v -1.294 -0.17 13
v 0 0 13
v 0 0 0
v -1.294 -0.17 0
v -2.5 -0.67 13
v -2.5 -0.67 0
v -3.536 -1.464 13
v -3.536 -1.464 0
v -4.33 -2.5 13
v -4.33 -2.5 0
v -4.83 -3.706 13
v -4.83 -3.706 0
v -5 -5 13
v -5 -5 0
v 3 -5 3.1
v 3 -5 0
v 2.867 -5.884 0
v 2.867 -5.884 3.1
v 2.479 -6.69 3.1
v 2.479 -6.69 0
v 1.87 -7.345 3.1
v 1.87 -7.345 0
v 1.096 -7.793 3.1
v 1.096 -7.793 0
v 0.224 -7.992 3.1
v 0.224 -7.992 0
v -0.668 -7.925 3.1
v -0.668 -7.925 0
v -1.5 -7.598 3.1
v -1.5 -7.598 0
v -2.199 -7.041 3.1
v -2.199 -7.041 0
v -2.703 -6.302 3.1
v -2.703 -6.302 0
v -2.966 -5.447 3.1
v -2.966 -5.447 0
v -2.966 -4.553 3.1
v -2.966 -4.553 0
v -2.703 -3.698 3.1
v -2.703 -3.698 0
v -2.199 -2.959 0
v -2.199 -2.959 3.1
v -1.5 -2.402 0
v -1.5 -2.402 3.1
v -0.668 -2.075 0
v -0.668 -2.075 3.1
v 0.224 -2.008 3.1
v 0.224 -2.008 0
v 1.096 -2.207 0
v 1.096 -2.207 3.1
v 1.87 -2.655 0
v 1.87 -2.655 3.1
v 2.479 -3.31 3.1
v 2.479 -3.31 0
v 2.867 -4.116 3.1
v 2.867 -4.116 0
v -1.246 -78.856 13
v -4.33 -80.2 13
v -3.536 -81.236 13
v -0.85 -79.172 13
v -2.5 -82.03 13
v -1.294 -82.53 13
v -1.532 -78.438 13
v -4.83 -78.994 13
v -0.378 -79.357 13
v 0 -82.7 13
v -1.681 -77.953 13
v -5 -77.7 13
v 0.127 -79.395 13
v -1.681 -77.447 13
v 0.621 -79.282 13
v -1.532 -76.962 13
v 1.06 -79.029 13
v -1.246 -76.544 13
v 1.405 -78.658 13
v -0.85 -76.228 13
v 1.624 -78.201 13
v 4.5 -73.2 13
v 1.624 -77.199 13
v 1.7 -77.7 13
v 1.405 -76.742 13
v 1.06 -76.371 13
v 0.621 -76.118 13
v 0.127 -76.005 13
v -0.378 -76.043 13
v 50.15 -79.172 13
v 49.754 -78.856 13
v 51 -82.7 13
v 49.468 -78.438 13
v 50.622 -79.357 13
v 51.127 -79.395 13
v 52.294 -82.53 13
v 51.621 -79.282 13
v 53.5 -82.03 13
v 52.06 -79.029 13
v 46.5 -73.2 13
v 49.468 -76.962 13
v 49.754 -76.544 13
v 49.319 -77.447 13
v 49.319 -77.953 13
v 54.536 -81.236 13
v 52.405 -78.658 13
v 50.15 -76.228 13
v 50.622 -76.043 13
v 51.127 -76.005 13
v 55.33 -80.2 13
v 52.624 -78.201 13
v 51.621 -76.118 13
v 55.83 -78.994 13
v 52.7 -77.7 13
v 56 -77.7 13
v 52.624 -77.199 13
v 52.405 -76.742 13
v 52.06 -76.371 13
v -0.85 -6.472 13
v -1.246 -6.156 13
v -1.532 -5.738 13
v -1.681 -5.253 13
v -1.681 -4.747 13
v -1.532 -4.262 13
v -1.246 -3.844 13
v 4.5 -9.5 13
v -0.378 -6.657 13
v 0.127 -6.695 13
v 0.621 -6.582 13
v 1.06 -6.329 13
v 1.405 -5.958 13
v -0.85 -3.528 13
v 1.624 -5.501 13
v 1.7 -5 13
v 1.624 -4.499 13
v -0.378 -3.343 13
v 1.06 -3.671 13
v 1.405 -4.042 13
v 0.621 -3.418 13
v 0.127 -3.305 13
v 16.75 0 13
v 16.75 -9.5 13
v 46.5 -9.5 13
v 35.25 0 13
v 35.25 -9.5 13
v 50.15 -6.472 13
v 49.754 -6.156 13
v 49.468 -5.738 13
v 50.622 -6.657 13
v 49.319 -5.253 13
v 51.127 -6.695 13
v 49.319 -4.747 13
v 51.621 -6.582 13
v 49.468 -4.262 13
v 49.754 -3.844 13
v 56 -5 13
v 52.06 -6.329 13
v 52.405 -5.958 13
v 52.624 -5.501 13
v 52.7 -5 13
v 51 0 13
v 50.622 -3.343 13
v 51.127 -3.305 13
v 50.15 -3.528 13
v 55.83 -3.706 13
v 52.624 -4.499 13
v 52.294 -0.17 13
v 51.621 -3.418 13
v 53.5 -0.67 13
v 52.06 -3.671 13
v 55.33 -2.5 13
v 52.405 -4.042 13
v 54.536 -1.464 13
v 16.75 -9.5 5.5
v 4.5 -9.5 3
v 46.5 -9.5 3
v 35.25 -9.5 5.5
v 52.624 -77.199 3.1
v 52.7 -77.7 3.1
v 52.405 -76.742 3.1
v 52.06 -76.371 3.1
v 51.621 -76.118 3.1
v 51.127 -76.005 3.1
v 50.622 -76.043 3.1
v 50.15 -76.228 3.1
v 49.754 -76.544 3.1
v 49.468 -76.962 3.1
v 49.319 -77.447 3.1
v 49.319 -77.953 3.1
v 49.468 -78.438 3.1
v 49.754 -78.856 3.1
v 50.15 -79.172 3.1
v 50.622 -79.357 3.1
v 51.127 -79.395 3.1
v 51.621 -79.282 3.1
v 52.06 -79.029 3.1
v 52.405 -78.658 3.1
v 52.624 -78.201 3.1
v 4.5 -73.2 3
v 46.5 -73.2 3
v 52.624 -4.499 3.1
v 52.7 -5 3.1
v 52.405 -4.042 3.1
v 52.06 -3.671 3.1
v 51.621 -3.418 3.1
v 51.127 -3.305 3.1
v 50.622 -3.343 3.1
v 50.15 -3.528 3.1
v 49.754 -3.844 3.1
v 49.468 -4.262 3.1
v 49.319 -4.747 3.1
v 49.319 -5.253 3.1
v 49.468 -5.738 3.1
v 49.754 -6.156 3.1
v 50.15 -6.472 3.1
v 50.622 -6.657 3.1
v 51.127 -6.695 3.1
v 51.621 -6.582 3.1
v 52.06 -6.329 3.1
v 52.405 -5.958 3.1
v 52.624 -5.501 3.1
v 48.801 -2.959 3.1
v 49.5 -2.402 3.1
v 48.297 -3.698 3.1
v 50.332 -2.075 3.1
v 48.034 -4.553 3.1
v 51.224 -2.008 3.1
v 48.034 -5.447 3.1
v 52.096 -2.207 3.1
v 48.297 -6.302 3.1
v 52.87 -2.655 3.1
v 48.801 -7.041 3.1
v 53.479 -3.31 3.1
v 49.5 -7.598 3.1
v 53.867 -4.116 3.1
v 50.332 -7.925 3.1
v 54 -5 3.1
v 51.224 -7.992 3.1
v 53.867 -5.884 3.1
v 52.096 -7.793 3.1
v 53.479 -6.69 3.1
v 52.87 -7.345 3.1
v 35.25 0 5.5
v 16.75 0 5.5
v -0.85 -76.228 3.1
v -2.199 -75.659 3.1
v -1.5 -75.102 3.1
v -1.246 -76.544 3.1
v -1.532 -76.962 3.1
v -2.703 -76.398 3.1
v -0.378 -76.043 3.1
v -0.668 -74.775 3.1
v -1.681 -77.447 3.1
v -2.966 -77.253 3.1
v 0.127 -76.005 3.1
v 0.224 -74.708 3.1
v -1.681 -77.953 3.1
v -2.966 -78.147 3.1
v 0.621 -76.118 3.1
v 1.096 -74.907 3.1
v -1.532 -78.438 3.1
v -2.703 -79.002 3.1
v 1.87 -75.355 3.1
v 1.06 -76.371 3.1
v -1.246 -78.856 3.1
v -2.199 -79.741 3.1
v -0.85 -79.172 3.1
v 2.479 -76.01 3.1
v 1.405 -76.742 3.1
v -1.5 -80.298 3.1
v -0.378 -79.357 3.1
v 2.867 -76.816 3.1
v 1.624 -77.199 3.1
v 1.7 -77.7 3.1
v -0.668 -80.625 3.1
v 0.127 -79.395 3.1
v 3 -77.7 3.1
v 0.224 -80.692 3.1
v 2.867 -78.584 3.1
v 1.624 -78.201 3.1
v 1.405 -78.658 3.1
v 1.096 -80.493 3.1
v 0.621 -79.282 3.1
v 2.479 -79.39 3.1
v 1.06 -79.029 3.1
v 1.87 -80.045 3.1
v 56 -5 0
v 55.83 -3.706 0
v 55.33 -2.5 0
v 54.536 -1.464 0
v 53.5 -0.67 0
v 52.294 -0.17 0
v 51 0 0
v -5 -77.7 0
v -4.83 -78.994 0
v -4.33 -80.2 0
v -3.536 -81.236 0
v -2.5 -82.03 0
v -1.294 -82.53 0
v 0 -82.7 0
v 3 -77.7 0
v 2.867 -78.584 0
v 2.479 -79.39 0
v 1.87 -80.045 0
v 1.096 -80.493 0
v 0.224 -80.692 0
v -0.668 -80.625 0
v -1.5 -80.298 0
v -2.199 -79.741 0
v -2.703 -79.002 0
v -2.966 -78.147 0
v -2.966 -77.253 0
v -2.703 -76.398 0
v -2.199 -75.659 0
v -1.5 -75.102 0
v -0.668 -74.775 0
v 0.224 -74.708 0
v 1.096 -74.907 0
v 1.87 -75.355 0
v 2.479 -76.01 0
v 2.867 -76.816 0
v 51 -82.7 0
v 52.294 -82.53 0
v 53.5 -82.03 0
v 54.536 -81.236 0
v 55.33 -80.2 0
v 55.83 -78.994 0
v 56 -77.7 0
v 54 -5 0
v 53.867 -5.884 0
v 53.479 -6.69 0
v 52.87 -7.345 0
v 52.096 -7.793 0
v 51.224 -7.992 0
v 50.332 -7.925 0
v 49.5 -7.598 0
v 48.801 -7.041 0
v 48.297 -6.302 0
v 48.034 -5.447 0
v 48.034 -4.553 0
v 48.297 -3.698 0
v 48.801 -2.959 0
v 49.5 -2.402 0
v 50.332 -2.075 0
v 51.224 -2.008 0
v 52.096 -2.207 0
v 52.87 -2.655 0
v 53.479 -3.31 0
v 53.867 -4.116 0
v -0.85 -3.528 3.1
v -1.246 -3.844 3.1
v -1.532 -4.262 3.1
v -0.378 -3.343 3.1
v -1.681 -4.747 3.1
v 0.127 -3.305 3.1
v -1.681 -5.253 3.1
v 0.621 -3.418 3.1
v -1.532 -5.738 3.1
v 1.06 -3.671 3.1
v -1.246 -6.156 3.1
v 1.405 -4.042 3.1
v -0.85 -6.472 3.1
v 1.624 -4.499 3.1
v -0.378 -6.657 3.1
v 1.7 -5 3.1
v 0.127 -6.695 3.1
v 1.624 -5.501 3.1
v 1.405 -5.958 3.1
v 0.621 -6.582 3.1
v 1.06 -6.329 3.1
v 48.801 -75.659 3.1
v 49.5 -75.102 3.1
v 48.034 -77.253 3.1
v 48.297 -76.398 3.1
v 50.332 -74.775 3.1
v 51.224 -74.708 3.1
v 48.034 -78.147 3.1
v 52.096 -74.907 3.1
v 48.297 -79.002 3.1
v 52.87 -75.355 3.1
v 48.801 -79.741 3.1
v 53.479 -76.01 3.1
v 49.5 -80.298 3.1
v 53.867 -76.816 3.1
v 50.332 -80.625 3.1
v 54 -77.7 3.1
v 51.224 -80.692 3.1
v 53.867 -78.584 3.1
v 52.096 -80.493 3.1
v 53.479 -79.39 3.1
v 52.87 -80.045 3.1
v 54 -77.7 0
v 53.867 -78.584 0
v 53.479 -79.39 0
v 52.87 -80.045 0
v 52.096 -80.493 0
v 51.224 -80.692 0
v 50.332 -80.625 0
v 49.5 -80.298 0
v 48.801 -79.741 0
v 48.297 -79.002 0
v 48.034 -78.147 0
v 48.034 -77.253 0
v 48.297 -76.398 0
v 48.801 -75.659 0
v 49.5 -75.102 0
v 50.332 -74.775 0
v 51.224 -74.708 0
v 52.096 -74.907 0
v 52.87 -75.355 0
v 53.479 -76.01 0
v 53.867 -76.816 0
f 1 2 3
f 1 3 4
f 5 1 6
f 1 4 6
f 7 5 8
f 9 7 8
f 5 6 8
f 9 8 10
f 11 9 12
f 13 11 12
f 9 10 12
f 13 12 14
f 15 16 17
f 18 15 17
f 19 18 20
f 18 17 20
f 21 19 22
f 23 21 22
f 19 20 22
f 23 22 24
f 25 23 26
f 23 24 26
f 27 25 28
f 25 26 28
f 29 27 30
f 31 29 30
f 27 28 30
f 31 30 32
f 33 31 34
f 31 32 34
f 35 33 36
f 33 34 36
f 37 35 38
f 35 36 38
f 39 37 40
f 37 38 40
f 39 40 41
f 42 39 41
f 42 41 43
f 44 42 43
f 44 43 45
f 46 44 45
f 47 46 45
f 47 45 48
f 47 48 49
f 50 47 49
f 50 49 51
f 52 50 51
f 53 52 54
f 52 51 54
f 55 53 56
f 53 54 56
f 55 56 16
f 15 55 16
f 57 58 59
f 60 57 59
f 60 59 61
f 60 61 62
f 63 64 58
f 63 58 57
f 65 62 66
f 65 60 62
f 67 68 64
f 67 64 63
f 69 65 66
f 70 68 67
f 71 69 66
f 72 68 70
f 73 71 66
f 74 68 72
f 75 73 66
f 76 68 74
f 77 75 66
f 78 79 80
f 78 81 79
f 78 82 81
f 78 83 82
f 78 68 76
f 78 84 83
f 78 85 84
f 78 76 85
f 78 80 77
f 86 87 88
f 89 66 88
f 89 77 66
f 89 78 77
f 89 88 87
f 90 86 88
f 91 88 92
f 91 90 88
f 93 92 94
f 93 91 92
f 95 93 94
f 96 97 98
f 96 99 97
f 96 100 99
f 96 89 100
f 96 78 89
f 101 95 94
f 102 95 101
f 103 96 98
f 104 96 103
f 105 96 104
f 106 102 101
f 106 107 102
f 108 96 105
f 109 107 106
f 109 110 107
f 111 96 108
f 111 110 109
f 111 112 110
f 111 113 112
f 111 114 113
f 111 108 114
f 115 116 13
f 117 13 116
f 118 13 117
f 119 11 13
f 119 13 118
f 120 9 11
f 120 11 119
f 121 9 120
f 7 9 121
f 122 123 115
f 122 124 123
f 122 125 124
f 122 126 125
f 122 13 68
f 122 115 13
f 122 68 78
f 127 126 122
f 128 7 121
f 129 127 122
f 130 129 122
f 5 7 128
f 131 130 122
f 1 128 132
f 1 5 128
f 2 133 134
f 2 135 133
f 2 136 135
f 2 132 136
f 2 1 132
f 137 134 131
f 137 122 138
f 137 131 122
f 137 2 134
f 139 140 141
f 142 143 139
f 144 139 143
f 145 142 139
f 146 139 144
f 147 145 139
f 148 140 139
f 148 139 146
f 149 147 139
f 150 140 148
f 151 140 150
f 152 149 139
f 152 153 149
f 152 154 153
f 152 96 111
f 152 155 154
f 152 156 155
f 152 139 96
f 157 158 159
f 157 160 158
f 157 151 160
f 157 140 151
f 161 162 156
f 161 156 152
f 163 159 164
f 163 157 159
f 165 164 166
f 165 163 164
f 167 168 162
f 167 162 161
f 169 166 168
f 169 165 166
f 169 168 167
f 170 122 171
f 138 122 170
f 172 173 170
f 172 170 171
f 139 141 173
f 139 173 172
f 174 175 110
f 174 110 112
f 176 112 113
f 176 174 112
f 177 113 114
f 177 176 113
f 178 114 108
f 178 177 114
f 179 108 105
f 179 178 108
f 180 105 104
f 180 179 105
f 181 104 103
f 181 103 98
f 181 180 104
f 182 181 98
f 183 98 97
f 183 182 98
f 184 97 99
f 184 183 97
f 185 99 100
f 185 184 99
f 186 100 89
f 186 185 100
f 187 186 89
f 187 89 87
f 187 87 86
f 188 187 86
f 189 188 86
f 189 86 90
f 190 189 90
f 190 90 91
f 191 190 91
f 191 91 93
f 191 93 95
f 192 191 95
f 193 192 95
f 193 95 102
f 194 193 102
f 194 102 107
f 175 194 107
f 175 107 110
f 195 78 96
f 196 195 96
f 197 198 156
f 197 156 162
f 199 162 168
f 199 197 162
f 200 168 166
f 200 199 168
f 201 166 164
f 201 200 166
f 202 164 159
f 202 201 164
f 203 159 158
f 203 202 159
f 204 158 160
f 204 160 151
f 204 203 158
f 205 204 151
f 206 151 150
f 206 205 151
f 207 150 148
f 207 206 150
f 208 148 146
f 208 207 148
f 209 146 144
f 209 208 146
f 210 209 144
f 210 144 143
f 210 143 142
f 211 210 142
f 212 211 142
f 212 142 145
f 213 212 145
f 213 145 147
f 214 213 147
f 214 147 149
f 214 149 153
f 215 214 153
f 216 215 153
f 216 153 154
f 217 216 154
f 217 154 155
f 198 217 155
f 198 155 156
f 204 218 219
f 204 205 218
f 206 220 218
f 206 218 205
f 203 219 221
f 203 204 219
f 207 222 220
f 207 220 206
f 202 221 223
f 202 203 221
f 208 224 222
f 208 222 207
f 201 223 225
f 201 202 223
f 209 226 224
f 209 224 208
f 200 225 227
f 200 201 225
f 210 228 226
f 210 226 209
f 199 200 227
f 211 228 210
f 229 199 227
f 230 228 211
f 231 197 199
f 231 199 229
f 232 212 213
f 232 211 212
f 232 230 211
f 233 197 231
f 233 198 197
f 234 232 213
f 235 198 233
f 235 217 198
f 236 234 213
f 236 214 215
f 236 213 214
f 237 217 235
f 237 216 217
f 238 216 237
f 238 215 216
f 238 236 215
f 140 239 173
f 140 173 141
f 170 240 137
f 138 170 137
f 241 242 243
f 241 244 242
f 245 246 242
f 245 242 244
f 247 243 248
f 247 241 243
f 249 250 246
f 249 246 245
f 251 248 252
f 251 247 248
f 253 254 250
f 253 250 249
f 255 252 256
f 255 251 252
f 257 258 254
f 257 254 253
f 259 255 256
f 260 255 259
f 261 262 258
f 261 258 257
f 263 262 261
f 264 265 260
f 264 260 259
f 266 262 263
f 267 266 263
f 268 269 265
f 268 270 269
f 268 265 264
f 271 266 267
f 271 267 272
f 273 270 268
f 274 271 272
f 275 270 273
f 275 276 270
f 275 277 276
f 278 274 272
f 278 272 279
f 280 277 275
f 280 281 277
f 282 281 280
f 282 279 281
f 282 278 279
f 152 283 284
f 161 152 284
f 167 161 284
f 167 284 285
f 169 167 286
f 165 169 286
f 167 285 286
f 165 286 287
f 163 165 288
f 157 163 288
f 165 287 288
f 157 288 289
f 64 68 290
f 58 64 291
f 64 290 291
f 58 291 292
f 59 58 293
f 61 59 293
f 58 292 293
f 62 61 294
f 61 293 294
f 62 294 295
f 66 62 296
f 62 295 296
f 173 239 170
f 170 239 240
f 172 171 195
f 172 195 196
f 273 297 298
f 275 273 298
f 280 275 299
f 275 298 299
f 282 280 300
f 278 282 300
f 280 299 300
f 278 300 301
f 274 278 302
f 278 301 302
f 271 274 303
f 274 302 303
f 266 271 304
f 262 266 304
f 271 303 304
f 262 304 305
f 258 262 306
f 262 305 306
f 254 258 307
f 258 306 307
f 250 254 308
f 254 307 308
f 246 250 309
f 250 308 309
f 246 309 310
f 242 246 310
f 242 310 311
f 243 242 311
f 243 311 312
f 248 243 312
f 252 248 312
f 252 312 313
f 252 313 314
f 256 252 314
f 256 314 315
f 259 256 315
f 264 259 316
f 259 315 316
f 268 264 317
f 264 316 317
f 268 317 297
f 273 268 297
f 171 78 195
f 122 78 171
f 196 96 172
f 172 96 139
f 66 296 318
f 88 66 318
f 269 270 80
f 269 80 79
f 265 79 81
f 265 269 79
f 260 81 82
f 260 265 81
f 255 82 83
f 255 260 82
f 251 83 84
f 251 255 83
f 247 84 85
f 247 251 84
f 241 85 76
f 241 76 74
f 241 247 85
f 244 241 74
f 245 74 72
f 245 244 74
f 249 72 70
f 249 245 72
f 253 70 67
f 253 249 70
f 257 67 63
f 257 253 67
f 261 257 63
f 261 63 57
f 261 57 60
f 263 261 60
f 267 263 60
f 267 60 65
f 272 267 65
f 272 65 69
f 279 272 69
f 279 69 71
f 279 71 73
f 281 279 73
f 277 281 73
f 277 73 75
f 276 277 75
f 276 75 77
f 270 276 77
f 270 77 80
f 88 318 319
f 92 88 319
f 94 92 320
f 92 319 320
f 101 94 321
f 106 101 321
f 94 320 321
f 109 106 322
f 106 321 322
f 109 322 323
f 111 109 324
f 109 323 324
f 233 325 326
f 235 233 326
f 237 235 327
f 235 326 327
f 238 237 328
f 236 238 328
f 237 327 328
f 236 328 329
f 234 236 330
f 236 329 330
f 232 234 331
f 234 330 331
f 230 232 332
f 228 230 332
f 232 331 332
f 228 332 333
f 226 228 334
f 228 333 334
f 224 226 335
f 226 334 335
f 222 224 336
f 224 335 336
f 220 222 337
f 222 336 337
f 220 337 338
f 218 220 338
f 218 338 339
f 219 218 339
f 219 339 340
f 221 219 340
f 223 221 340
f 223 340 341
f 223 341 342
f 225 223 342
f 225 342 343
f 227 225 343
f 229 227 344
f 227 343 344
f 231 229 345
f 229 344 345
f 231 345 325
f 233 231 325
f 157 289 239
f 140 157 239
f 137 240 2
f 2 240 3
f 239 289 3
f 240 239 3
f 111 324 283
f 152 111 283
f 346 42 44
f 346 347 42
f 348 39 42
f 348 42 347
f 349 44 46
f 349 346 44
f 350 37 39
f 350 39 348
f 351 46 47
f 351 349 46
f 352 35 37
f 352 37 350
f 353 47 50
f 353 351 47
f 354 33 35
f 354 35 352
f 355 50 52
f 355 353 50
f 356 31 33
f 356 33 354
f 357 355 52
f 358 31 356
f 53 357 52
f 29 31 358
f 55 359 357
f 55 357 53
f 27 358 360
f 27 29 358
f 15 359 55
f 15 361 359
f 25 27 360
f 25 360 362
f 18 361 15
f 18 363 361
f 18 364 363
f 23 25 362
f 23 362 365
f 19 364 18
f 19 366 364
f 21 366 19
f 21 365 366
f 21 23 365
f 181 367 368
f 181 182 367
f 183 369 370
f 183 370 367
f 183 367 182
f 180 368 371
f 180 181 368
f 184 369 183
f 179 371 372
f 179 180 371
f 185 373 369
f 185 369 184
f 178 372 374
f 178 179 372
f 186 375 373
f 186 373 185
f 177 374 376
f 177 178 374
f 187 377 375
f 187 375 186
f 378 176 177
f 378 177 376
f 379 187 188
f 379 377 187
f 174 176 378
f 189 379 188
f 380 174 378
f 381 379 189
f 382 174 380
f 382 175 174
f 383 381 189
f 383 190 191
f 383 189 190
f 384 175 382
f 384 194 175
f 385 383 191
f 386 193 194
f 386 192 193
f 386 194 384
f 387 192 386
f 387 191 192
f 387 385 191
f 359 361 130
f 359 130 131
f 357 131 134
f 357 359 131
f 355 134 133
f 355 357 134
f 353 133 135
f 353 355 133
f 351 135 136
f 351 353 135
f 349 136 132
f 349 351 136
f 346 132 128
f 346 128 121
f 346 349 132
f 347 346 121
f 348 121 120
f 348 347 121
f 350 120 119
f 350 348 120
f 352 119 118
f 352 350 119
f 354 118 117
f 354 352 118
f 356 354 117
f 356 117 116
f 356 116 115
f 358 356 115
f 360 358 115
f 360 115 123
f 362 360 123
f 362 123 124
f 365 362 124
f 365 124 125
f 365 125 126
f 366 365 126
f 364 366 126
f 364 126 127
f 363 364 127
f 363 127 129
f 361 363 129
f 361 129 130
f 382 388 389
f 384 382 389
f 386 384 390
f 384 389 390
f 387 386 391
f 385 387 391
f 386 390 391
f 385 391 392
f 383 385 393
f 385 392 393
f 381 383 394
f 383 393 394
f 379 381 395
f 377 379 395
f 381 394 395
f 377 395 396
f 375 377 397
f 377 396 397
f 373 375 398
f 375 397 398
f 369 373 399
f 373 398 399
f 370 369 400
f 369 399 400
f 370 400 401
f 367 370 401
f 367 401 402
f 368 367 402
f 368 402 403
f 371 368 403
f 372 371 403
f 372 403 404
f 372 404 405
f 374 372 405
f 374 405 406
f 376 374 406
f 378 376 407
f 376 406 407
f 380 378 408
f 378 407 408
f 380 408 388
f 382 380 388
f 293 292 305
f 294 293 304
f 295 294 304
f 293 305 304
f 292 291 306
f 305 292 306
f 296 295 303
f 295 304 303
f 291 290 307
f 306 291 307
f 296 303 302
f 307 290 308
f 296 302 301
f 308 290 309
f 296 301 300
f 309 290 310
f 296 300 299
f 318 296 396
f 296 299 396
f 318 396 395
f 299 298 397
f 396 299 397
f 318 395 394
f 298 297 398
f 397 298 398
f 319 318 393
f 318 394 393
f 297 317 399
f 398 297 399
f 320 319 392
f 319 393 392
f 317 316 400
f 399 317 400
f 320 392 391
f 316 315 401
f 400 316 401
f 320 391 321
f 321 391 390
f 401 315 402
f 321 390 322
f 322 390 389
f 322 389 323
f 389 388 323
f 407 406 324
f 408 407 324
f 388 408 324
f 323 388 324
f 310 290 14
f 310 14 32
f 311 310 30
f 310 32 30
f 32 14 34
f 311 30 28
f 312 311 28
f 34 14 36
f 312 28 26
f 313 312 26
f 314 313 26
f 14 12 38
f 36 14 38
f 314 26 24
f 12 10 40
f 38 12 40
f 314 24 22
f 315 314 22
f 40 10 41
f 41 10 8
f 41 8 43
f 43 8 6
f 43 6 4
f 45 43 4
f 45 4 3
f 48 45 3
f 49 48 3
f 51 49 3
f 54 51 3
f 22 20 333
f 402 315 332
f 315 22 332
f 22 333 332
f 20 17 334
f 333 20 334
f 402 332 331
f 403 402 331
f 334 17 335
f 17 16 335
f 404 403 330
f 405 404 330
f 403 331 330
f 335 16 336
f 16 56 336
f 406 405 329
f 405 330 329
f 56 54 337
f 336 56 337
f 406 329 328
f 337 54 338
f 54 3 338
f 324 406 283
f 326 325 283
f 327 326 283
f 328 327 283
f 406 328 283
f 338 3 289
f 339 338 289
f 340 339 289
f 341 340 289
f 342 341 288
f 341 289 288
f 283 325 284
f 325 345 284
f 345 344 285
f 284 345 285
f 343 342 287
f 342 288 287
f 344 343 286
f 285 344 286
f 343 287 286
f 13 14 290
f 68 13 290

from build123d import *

# Parameters (mm, degrees)
SKETCH_R        = 1.7
PAD_DEPTH       = 13
SKETCH001_W     = 42
SKETCH001_H     = 63.7
POCKET_DEPTH    = 10
SKETCH002_W     = 18.5
SKETCH002_H     = 7.5
POCKET001_DEPTH = 11
SKETCH003_R     = 3
POCKET002_DEPTH = 3.1


with BuildPart() as part:
    # Sketch → Pad (new body)
    with BuildSketch(Plane.XY):
        with BuildLine():
            Line((-5, -5), (-5, -77.7))
            ThreePointArc((-5, -77.7), (-3.535534, -81.235534), (0, -82.7))
            Line((0, -82.7), (51, -82.7))
            ThreePointArc((51, -82.7), (54.535534, -81.235534), (56, -77.7))
            Line((56, -77.7), (56, -5))
            ThreePointArc((56, -5), (54.535534, -1.464466), (51, 0))
            Line((51, 0), (0, 0))
            ThreePointArc((0, 0), (-3.535534, -1.464466), (-5, -5))
        make_face()
        with Locations((0, -5)):
            Circle(SKETCH_R, mode=Mode.SUBTRACT)
        with Locations((51, -5)):
            Circle(SKETCH_R, mode=Mode.SUBTRACT)
        with Locations((51, -77.7)):
            Circle(SKETCH_R, mode=Mode.SUBTRACT)
        with Locations((0, -77.7)):
            Circle(SKETCH_R, mode=Mode.SUBTRACT)
    extrude(amount=PAD_DEPTH)

    # Sketch001 (on Face14 of Pad) → Pocket (cut)
    with BuildSketch(Plane.XY.offset(13)):
        with Locations((25.5, -41.35)):
            Rectangle(SKETCH001_W, SKETCH001_H)
    extrude(amount=-POCKET_DEPTH, mode=Mode.SUBTRACT)

    # Sketch002 (on Face6 of Pocket) → Pocket001 (cut)
    with BuildSketch(Plane(origin=(0, 0, 0), x_dir=(-1, 0, 0), z_dir=(0, 1, 0))):
        with Locations((-26, 9.25)):
            Rectangle(SKETCH002_W, SKETCH002_H)
    extrude(amount=-POCKET001_DEPTH, mode=Mode.SUBTRACT)

    # Sketch003 (on Face4 of Pocket001) → Pocket002 (cut)
    with BuildSketch(Plane(origin=(0, 0, 0), x_dir=(1, 0, 0), z_dir=(0, 0, -1))):
        with Locations((0, 5)):
            Circle(SKETCH003_R)
        with Locations((51, 5)):
            Circle(SKETCH003_R)
        with Locations((51, 77.7)):
            Circle(SKETCH003_R)
        with Locations((0, 77.7)):
            Circle(SKETCH003_R)
    extrude(amount=-POCKET002_DEPTH, mode=Mode.SUBTRACT)


solid = part.part
